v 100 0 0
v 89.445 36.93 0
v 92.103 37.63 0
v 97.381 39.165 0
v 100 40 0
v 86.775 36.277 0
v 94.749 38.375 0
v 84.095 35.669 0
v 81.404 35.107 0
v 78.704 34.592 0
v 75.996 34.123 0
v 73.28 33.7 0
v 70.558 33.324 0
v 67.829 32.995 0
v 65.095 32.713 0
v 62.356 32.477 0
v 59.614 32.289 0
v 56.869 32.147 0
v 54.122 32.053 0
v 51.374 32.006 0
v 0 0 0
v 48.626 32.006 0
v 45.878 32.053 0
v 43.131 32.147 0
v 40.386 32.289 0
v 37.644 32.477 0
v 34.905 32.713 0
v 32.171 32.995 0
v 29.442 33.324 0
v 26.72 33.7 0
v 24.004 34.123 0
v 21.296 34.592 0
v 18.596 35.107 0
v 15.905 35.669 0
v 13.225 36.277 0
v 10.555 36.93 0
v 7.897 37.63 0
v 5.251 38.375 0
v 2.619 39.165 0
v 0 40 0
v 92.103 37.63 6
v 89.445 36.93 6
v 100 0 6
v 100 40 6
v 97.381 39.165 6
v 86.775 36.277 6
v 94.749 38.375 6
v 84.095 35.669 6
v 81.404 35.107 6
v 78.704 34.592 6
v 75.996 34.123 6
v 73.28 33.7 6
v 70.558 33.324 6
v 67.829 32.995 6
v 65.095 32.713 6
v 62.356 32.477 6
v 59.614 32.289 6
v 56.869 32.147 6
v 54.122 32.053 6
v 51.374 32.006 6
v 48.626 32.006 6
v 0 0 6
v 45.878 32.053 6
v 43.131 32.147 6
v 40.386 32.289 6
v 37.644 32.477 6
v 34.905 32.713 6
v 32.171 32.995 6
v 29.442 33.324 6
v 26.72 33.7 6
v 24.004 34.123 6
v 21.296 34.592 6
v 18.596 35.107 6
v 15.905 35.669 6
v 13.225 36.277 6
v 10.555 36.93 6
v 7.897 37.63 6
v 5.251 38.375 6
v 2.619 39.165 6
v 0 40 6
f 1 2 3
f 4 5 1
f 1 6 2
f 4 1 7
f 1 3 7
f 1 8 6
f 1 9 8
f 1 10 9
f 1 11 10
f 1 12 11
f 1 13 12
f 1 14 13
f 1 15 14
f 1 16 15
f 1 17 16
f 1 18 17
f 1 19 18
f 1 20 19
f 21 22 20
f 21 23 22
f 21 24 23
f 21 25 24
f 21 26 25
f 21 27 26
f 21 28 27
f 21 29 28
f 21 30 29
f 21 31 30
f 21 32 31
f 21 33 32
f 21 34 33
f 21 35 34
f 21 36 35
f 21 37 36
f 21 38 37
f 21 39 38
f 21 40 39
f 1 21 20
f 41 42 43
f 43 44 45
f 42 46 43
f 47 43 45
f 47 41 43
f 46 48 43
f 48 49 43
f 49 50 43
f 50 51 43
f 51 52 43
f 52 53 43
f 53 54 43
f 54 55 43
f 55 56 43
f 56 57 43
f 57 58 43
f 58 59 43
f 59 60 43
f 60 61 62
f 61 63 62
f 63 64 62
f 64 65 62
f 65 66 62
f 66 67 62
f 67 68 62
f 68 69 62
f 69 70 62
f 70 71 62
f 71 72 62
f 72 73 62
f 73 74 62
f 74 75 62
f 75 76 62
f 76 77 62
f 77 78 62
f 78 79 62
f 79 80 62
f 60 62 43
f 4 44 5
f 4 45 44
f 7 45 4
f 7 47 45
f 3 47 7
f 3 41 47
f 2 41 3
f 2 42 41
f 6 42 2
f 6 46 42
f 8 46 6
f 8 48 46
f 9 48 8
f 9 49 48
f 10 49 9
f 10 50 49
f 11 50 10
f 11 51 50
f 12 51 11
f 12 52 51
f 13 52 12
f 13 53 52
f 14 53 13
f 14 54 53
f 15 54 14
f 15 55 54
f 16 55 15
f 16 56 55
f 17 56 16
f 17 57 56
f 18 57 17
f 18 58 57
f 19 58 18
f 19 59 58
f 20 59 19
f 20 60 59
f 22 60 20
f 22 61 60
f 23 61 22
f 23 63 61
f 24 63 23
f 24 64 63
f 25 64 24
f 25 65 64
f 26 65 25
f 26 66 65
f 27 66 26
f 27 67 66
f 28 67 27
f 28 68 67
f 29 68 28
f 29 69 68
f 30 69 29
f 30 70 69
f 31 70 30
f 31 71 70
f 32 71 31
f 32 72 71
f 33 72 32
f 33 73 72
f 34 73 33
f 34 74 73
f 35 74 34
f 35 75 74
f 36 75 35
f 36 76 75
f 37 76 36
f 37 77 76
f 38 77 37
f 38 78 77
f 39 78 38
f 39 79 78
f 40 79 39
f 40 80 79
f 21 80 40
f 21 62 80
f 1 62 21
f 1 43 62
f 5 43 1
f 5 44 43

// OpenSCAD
$fn = 32;

// ----------------------------------------------------------------------
// Arc profile plate: notch, 40 points
// ----------------------------------------------------------------------

// --- parameters (mm) ---
bar_l = 100;              // bar length, X
bar_w = 40;               // bar width, Y
notch_depth = 8;          // depth of the arc notch at mid-span
arc_r = 160.25;           // radius of the notch arc
arc_angle = 36.36;        // notch arc angle, degrees
arc_step = 1;             // sampling step of the notch arc, degrees
plate_t = 6;              // plate thickness, Z
fit_tol = 0.1;            // declared fit tolerance (prompt contract)
free_tol = 0.5;           // declared free tolerance (prompt contract)

profile = [[0, 0], [100, 0], [100, 40], [97.381, 39.165], [94.749, 38.375], [92.103, 37.63], [89.445, 36.93], [86.775, 36.277], [84.095, 35.669], [81.404, 35.107], [78.704, 34.592], [75.996, 34.123], [73.28, 33.7], [70.558, 33.324], [67.829, 32.995], [65.095, 32.713], [62.356, 32.477], [59.614, 32.289], [56.869, 32.147], [54.122, 32.053], [51.374, 32.006], [48.626, 32.006], [45.878, 32.053], [43.131, 32.147], [40.386, 32.289], [37.644, 32.477], [34.905, 32.713], [32.171, 32.995], [29.442, 33.324], [26.72, 33.7], [24.004, 34.123], [21.296, 34.592], [18.596, 35.107], [15.905, 35.669], [13.225, 36.277], [10.555, 36.93], [7.897, 37.63], [5.251, 38.375], [2.619, 39.165], [0, 40]];  // primary outline, 40 points, counter clockwise

// --- the one profile operation ---
linear_extrude(height = plate_t) polygon(points = profile);
